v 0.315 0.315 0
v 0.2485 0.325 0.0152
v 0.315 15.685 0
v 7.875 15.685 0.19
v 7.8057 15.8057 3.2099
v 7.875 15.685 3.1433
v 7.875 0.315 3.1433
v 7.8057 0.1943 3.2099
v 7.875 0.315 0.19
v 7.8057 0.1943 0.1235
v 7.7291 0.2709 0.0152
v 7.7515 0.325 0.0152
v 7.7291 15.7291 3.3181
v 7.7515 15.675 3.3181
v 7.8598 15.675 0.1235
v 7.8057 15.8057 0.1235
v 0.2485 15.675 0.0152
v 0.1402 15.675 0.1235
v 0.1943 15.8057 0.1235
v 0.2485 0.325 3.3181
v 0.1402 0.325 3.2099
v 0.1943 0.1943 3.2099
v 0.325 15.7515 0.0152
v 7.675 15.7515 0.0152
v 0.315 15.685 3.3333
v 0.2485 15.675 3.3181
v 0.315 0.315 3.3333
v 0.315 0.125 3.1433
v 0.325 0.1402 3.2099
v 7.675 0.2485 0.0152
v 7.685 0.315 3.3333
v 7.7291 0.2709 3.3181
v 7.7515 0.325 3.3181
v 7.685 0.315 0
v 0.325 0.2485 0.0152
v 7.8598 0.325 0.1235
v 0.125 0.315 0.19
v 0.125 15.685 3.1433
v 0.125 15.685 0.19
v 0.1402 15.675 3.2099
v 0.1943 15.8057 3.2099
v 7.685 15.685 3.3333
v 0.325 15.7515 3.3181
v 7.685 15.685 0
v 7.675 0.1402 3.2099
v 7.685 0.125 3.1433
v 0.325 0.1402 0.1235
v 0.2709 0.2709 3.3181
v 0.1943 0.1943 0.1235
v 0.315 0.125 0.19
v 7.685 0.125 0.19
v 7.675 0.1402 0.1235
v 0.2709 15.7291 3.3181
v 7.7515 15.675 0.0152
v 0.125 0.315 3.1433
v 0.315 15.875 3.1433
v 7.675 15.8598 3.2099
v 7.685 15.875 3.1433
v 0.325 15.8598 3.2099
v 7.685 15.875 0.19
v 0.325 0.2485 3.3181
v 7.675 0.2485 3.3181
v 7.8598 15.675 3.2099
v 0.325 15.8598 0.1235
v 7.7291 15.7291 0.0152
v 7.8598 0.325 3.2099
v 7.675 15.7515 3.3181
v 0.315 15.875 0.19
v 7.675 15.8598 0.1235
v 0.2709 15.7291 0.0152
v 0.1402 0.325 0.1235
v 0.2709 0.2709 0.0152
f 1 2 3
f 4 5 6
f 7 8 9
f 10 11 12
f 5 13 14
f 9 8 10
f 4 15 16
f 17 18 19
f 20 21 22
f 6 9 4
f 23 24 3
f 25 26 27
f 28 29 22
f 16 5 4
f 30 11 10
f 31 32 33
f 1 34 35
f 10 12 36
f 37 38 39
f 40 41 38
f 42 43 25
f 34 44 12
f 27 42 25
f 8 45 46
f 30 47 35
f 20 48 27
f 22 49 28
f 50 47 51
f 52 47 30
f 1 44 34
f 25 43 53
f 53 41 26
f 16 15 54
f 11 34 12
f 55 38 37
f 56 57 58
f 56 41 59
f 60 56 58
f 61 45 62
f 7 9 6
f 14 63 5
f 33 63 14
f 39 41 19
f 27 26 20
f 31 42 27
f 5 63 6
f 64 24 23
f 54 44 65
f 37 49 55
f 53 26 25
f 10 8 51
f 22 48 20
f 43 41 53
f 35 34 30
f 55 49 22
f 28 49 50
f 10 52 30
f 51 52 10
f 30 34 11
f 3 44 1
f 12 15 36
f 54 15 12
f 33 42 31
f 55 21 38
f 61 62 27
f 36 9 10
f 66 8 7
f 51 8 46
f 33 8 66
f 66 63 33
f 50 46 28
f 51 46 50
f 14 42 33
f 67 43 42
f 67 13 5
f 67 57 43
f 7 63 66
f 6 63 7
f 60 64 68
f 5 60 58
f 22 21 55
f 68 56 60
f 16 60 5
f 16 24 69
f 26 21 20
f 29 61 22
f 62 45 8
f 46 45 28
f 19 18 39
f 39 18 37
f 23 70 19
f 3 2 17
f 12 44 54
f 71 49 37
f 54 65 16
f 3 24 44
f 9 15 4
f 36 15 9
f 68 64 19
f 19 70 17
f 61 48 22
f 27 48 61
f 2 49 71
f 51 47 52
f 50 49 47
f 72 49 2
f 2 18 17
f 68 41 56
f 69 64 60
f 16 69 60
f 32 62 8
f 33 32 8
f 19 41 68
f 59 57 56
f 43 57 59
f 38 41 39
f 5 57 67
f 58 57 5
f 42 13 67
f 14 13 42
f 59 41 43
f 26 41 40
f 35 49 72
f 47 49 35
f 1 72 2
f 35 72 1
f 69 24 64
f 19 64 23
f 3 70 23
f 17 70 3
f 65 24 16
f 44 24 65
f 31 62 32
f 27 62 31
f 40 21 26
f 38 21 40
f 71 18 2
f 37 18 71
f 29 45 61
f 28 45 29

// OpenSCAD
// file: lcbm_corner_bevel.scad
// Lego Compatible Build Modules

module lcbm_corner_bevel(bevel=0.2,flat=0.0) {
    local_flat=(flat>0.0&&flat<=bevel)?flat:0.1*bevel;
    hull() {
        sphere(r=bevel,$fn=8);
        cube([2*bevel,local_flat,local_flat],center=true);
        cube([local_flat,2*bevel,local_flat],center=true);
        cube([local_flat,local_flat,2*bevel],center=true);
    }
}
// main file
// Lego Compatible Build Modules

use <lcbm_corner_bevel.scad>;
test_module="test lcbm_block_body";

module lcbm_block_body(unit=[8.0,8.0,10.0/3.0],size=[1,1,1],bevel=0.2,flat=0.0,center=true,shrink=0.0) {
    offset_x=(center)?-size[0]*unit[0]/2:0.0;
    offset_y=(center)?-size[1]*unit[1]/2:0.0;
    translate([offset_x,offset_y]) hull() {
        translate([bevel+shrink/2,bevel+shrink/2,0]) {
            translate([0,0,bevel]) lcbm_corner_bevel(bevel=bevel,flat=flat);
            translate([0,0,unit[2]*size[2]-bevel]) lcbm_corner_bevel(bevel=bevel,flat=flat);
        }
        translate([unit[0]*size[0]-bevel-shrink/2,bevel+shrink/2,0]) {
            translate([0,0,bevel]) lcbm_corner_bevel(bevel=bevel,flat=flat);
            translate([0,0,unit[2]*size[2]-bevel]) lcbm_corner_bevel(bevel=bevel,flat=flat);
        }
        translate([bevel+shrink/2,unit[1]*size[1]-bevel-shrink/2,0]) {
            translate([0,0,bevel]) lcbm_corner_bevel(bevel=bevel,flat=flat);
            translate([0,0,unit[2]*size[2]-bevel]) lcbm_corner_bevel(bevel=bevel,flat=flat);
        }
        translate([unit[0]*size[0]-bevel-shrink/2,unit[1]*size[1]-bevel-shrink/2,0]) {
            translate([0,0,bevel]) lcbm_corner_bevel(bevel=bevel,flat=flat);
            translate([0,0,unit[2]*size[2]-bevel]) lcbm_corner_bevel(bevel=bevel,flat=flat);
        }
    }
}

if(test_module=="test lcbm_block_body") {
    echo("Testing lcbm_block_body...");
    lcbm_block_body(size=[1,2,1],center=false,shrink=0.25);
    %cube([8,16,10/3],center=false);
}
